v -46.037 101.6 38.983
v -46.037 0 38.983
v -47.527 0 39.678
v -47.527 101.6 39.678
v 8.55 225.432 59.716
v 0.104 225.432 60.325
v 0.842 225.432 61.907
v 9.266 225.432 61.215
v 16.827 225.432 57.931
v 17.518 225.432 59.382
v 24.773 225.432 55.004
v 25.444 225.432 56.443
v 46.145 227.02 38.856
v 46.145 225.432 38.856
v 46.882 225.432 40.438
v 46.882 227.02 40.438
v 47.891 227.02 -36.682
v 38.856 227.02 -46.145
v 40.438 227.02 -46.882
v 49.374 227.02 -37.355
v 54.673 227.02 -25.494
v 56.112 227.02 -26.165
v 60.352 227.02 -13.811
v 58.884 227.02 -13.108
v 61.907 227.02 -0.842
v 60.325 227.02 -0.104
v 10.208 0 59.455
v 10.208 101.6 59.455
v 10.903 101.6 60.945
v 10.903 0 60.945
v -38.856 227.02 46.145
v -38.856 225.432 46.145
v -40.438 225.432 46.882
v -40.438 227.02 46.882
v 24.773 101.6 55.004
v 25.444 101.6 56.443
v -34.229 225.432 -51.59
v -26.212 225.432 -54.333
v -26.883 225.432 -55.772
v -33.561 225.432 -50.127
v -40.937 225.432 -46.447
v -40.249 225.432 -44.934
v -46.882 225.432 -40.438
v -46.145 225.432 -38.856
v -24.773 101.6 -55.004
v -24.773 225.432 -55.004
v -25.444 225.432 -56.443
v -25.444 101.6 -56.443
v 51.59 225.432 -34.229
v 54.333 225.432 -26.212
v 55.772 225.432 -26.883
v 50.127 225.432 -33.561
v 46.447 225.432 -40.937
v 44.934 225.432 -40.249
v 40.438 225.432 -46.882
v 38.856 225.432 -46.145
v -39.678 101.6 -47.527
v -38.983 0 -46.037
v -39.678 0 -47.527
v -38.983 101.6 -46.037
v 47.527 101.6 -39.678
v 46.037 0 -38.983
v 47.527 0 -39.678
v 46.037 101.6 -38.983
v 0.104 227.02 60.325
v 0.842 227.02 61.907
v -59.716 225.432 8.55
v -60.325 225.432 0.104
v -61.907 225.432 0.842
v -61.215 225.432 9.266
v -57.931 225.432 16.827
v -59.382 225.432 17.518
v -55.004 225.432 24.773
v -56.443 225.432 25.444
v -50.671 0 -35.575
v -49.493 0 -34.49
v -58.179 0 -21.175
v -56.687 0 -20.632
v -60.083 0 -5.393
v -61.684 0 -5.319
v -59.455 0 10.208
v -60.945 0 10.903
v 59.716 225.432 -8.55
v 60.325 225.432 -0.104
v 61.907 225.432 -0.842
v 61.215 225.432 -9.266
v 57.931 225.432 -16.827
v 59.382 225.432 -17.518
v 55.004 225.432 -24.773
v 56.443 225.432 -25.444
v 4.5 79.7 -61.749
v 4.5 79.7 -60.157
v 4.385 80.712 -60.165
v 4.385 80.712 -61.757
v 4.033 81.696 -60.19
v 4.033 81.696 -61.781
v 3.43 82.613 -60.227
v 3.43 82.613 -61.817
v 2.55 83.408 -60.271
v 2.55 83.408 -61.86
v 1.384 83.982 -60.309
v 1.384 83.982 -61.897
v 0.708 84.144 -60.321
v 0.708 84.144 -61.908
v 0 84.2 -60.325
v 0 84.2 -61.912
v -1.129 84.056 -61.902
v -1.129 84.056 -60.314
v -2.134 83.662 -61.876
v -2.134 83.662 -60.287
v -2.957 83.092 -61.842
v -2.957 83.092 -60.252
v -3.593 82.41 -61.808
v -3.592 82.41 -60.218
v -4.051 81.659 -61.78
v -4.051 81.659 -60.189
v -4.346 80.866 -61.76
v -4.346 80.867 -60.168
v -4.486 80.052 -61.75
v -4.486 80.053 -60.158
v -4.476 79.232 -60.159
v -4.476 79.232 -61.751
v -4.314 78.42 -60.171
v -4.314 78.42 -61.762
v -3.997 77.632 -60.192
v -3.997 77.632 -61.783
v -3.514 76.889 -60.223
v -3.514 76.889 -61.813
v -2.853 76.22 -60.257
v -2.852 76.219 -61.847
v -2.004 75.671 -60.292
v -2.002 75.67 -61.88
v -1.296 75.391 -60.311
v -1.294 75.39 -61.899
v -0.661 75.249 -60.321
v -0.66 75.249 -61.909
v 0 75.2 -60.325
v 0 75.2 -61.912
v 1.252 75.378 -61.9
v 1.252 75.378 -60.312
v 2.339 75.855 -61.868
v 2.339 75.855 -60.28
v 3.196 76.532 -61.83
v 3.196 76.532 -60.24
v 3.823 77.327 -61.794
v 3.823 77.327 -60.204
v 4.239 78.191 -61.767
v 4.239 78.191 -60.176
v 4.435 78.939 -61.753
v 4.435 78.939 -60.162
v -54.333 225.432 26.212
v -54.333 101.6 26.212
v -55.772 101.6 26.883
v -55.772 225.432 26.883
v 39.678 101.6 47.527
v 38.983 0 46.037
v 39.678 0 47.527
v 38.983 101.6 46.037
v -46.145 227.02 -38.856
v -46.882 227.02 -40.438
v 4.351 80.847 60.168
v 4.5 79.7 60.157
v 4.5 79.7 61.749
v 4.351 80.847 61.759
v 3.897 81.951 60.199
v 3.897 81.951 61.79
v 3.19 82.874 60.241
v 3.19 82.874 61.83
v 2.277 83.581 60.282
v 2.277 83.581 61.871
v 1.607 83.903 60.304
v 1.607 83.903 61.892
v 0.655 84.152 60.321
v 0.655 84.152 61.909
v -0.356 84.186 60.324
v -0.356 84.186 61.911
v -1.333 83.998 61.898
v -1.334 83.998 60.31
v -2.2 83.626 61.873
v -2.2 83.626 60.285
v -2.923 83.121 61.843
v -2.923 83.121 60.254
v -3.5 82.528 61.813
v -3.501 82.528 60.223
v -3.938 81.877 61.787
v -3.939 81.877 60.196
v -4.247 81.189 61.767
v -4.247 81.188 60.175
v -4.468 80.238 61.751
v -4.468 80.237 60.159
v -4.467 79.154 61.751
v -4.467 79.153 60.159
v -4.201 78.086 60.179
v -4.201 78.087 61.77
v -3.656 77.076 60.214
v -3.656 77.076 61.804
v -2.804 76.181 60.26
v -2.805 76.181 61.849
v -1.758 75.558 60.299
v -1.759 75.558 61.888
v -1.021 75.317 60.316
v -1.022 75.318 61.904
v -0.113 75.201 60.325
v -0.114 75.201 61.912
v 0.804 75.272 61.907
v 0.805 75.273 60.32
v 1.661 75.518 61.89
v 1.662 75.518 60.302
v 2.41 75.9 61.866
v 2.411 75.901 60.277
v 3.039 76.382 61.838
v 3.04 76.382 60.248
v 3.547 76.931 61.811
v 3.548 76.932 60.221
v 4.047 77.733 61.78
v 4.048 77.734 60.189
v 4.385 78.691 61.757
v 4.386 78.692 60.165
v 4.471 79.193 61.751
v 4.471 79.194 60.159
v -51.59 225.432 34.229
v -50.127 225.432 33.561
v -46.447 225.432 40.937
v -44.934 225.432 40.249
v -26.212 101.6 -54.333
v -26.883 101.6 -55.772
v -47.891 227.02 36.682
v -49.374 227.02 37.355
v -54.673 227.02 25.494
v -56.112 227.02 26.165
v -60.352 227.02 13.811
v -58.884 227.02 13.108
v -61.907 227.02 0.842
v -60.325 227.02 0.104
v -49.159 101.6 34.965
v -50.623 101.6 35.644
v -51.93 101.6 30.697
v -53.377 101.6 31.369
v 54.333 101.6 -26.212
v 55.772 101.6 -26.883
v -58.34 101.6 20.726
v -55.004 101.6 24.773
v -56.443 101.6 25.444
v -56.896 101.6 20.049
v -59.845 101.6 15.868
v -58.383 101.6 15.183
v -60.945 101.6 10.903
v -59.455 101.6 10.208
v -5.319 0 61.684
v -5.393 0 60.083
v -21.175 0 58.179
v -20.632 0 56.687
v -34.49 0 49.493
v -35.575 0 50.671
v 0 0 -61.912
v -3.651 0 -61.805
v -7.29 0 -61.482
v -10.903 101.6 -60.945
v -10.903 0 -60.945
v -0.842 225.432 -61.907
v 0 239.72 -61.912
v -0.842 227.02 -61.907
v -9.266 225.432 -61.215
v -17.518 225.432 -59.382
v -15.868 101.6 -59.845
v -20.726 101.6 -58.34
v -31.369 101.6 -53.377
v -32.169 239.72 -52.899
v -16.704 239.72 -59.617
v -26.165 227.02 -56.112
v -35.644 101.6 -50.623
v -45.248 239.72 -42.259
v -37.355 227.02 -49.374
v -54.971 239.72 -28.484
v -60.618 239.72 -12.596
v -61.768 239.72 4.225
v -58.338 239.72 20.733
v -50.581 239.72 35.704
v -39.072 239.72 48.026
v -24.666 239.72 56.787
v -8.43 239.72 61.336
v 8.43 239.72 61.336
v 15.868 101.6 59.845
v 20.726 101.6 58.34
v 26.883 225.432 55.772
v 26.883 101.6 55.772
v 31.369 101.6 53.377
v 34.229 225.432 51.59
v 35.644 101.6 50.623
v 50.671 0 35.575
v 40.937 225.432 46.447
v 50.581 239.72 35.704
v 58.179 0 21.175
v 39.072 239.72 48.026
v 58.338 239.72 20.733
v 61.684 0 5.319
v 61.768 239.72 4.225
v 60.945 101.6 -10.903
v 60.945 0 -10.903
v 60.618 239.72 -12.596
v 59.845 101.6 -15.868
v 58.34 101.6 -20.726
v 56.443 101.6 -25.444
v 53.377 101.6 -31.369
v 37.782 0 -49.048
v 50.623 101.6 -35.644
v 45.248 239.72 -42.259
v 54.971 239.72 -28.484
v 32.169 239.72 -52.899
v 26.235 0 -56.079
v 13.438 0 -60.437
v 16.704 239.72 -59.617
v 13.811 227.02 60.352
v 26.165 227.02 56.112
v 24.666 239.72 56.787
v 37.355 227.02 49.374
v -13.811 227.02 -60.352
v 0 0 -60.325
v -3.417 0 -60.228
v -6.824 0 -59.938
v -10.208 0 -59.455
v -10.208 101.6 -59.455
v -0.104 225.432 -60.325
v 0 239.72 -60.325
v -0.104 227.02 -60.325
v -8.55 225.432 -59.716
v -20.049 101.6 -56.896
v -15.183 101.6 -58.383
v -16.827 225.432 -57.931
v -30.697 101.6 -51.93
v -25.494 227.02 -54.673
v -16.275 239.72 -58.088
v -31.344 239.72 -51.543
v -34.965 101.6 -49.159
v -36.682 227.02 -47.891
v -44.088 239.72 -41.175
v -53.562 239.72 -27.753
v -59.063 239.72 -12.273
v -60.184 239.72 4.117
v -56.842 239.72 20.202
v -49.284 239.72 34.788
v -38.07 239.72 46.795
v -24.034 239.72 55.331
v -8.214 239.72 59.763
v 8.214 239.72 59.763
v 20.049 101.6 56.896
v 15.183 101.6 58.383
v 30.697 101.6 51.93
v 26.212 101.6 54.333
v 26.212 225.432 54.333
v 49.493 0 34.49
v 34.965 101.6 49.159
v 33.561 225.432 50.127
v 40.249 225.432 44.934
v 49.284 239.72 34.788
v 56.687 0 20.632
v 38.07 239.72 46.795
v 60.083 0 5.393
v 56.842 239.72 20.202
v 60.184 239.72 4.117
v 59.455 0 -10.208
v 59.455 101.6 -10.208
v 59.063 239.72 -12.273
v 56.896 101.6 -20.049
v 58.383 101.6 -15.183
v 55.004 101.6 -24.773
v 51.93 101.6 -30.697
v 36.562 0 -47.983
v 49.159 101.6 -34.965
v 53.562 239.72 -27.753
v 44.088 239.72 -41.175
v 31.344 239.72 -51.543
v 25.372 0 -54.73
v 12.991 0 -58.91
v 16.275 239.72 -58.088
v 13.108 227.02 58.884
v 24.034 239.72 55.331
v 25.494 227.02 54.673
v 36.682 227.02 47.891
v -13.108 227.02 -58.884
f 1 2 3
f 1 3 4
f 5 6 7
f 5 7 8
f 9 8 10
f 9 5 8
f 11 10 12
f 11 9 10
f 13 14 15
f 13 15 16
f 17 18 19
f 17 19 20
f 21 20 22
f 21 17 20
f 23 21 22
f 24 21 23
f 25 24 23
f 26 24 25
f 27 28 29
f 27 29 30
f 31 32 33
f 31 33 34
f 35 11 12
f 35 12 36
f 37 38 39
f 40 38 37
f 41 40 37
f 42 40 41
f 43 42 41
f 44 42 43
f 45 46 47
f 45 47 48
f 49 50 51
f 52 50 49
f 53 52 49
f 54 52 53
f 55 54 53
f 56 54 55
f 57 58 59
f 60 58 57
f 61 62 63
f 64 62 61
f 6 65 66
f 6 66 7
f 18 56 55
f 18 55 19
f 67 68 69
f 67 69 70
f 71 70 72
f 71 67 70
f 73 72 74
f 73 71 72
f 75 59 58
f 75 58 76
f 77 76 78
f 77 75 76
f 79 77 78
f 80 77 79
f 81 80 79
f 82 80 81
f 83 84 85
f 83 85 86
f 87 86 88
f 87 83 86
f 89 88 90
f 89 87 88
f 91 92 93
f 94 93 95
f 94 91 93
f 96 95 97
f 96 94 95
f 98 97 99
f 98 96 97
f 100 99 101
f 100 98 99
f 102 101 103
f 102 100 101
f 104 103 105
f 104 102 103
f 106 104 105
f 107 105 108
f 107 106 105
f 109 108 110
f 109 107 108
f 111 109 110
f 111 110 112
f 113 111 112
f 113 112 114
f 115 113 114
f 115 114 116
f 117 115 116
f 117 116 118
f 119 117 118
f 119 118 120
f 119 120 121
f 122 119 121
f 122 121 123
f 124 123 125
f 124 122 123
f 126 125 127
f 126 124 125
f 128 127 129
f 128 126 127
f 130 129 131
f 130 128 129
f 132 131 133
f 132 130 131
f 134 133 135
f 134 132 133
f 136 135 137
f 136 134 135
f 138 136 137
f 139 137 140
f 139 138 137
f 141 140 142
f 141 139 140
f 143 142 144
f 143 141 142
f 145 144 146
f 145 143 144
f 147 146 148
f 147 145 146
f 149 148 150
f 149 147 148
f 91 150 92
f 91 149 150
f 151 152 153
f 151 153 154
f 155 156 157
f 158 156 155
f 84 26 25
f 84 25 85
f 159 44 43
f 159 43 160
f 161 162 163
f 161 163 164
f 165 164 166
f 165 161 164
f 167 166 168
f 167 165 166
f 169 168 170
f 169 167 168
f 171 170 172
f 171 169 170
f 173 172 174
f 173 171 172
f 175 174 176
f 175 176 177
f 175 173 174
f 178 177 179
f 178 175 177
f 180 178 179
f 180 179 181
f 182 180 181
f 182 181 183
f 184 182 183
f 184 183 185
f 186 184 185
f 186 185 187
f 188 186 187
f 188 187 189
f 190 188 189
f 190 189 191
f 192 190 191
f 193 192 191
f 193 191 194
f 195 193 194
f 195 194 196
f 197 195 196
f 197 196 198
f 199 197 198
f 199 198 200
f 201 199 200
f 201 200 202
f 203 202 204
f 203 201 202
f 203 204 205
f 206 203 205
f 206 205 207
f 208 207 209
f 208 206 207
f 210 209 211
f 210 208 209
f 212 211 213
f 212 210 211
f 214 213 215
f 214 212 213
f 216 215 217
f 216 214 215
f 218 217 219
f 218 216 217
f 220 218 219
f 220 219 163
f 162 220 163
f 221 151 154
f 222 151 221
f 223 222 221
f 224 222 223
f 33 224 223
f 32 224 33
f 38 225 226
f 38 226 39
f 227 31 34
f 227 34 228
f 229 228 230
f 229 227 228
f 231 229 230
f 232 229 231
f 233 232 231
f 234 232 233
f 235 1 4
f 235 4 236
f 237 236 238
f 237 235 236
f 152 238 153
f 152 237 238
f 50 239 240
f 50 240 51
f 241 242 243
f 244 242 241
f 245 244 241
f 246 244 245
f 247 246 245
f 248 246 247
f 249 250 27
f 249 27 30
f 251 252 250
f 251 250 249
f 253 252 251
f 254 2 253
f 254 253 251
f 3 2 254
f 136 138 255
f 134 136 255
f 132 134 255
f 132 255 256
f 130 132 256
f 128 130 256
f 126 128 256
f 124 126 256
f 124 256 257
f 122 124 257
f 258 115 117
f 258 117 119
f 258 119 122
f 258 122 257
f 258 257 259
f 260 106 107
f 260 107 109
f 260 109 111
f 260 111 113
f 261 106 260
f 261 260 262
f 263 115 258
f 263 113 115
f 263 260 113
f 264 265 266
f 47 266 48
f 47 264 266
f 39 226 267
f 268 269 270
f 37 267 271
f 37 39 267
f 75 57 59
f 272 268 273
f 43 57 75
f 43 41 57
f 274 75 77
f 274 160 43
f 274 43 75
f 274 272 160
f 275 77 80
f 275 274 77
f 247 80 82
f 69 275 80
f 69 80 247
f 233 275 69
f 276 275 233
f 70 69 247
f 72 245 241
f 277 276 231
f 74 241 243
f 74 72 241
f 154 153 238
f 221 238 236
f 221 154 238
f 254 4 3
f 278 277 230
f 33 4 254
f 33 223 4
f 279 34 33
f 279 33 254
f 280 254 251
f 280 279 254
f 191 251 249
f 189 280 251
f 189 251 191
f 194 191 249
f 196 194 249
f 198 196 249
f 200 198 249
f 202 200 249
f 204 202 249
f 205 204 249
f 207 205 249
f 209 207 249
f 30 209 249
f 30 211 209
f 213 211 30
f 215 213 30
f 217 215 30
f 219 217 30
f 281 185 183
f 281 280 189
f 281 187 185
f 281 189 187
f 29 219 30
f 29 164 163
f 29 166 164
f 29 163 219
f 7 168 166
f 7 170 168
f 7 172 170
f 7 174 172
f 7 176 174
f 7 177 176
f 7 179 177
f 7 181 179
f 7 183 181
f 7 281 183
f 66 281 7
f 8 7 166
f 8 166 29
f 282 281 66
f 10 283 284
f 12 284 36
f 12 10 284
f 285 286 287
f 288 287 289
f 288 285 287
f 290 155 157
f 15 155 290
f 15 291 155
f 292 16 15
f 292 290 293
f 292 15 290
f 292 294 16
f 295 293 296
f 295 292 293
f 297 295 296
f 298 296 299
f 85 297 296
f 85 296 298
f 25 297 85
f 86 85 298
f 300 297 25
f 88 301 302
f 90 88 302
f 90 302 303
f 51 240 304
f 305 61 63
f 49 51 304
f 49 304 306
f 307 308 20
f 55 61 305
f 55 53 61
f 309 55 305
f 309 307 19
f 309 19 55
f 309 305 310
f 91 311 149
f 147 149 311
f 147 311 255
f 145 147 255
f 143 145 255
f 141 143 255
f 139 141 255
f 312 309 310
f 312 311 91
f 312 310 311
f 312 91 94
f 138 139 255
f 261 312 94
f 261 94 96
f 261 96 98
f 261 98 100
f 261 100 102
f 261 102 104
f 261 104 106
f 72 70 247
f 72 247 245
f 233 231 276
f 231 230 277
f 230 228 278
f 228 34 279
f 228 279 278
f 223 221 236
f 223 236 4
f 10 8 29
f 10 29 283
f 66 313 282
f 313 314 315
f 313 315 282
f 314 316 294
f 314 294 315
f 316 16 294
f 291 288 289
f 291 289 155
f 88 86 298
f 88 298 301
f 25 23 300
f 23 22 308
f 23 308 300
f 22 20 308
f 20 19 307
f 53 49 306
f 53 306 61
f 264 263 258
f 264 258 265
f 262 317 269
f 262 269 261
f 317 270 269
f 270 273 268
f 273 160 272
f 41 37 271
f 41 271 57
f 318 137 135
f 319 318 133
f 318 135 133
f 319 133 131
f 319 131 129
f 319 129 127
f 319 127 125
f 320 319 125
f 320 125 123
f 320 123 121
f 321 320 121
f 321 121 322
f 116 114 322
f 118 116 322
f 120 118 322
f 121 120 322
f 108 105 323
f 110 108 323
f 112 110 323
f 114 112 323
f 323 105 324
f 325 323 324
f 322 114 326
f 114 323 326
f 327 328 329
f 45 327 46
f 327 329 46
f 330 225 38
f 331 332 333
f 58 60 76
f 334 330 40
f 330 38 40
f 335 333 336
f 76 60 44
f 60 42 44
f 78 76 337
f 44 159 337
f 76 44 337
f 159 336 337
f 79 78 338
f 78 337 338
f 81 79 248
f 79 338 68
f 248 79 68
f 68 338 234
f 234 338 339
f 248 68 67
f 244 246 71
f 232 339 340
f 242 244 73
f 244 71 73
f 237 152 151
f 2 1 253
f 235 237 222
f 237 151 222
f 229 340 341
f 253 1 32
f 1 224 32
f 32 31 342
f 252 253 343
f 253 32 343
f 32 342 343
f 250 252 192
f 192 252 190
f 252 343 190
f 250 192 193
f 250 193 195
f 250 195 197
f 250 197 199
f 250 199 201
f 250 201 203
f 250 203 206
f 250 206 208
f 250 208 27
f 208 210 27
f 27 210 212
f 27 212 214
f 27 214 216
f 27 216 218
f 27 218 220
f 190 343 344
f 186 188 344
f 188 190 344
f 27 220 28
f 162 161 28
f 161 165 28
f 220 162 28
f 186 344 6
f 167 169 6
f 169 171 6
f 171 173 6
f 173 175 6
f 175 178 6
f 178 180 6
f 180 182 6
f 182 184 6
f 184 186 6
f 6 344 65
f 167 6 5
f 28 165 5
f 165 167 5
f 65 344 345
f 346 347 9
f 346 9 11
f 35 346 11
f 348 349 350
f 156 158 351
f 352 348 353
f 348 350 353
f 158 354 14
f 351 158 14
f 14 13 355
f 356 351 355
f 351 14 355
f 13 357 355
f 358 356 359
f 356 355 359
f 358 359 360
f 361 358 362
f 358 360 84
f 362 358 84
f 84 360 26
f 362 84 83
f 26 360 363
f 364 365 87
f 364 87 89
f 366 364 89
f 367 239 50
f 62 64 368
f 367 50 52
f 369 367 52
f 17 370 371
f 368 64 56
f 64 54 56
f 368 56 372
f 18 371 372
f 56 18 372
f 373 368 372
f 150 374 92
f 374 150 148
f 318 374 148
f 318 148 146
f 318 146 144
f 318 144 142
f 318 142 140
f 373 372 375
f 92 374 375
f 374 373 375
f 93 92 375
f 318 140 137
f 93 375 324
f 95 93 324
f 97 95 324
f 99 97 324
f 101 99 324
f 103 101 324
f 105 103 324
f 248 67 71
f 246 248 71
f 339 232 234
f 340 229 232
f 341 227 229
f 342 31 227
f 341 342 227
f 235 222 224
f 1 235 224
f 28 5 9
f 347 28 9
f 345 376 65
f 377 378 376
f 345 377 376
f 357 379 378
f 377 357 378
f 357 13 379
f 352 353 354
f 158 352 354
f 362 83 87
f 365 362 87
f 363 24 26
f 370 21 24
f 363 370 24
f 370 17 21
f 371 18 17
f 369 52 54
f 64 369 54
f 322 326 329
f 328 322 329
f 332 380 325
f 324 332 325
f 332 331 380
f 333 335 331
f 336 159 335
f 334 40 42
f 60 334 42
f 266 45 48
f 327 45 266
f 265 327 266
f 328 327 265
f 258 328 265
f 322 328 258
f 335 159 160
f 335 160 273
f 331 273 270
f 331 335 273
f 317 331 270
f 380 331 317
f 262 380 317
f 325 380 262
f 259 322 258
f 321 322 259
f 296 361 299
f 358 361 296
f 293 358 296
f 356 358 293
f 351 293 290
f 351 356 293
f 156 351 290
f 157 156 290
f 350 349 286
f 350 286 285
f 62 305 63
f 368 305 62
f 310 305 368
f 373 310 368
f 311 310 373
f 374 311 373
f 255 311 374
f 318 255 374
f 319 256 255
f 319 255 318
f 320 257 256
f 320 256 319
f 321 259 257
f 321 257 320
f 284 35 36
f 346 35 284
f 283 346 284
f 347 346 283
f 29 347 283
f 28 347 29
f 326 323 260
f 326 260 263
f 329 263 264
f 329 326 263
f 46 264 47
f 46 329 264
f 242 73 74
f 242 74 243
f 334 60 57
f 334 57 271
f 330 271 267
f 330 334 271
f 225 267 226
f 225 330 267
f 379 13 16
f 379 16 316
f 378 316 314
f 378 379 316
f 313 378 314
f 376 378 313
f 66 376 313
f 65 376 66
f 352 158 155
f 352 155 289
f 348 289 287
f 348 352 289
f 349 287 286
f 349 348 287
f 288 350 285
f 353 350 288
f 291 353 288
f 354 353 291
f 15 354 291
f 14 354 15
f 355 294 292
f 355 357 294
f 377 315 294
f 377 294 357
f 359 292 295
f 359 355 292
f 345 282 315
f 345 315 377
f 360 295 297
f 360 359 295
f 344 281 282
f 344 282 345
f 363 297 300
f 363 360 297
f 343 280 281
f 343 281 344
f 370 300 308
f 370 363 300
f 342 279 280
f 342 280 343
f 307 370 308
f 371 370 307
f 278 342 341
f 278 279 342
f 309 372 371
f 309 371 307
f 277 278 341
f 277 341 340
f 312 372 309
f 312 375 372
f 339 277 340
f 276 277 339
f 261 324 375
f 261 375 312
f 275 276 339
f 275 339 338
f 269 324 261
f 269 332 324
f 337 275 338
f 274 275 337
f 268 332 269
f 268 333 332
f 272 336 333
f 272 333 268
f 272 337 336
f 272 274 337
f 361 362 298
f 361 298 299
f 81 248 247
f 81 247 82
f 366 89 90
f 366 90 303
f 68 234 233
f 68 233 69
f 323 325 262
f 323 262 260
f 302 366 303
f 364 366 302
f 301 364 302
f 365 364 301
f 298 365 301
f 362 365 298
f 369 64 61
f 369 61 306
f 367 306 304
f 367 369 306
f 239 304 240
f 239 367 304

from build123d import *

# Parameters (mm, degrees)
CUT_EXTRUDE1_DEPTH      = 256.209705365
CUT_EXTRUDE1_DEPTH_BACK = 256.209705365
SKETCH2_R               = 4.5
CUT_EXTRUDE2_DEPTH      = 256.209705507
CIRPATTERN1_COUNT       = 4


with BuildPart() as part:
    # Sketch1 → Revolve1 (revolve)
    with BuildSketch(Plane.XY, mode=Mode.PRIVATE) as revolve1_sk:
        Polygon((-60.325, 239.72), (-60.325, 238.1325), (-60.325, 0), (-61.9125, 0), (-61.9125, 239.72), align=None)
    revolve(revolve1_sk.sketch.rotate(Axis((0, 0, 0), (0, 1, 0)), 270), axis=Axis((0, 0, 0), (0, 1, 0)))

    # Sketch2 → Cut-Extrude1 (cut, two sides: drawn at the far end of the back side and taken through both)
    with BuildSketch(Plane.XY.offset(-CUT_EXTRUDE1_DEPTH_BACK)):
        with Locations((0, 79.7)):
            Circle(SKETCH2_R)
    extrude(amount=CUT_EXTRUDE1_DEPTH + CUT_EXTRUDE1_DEPTH_BACK, mode=Mode.SUBTRACT)

    # Sketch3 → Cut-Extrude2 (cut, through all)
    with BuildSketch(Plane(origin=(0, 0, 0), x_dir=(0.906307787036651, 0, -0.4226182617406972), z_dir=(0.4226182617406972, 0, 0.906307787036651))):
        Polygon((-15.875, 0), (-15.875, 101.6), (-0.79375, 101.6), (-0.79375, 225.4325), (-25.4, 225.4325), (-25.4, 227.02), (25.4, 227.02), (25.4, 225.4325), (0.79375, 225.4325), (0.79375, 101.6), (15.875, 101.6), (15.875, 0), align=None)
    cut_extrude2 = extrude(amount=-CUT_EXTRUDE2_DEPTH, mode=Mode.SUBTRACT)

    # CirPattern1: Cut-Extrude2 ×4 about axis
    cirpattern1_axis = Axis((0, 0, 0), (0, 1, 0))
    for i in range(1, CIRPATTERN1_COUNT):
        add(cut_extrude2.rotate(cirpattern1_axis, i * 360 / CIRPATTERN1_COUNT), mode=Mode.SUBTRACT)


solid = part.part
